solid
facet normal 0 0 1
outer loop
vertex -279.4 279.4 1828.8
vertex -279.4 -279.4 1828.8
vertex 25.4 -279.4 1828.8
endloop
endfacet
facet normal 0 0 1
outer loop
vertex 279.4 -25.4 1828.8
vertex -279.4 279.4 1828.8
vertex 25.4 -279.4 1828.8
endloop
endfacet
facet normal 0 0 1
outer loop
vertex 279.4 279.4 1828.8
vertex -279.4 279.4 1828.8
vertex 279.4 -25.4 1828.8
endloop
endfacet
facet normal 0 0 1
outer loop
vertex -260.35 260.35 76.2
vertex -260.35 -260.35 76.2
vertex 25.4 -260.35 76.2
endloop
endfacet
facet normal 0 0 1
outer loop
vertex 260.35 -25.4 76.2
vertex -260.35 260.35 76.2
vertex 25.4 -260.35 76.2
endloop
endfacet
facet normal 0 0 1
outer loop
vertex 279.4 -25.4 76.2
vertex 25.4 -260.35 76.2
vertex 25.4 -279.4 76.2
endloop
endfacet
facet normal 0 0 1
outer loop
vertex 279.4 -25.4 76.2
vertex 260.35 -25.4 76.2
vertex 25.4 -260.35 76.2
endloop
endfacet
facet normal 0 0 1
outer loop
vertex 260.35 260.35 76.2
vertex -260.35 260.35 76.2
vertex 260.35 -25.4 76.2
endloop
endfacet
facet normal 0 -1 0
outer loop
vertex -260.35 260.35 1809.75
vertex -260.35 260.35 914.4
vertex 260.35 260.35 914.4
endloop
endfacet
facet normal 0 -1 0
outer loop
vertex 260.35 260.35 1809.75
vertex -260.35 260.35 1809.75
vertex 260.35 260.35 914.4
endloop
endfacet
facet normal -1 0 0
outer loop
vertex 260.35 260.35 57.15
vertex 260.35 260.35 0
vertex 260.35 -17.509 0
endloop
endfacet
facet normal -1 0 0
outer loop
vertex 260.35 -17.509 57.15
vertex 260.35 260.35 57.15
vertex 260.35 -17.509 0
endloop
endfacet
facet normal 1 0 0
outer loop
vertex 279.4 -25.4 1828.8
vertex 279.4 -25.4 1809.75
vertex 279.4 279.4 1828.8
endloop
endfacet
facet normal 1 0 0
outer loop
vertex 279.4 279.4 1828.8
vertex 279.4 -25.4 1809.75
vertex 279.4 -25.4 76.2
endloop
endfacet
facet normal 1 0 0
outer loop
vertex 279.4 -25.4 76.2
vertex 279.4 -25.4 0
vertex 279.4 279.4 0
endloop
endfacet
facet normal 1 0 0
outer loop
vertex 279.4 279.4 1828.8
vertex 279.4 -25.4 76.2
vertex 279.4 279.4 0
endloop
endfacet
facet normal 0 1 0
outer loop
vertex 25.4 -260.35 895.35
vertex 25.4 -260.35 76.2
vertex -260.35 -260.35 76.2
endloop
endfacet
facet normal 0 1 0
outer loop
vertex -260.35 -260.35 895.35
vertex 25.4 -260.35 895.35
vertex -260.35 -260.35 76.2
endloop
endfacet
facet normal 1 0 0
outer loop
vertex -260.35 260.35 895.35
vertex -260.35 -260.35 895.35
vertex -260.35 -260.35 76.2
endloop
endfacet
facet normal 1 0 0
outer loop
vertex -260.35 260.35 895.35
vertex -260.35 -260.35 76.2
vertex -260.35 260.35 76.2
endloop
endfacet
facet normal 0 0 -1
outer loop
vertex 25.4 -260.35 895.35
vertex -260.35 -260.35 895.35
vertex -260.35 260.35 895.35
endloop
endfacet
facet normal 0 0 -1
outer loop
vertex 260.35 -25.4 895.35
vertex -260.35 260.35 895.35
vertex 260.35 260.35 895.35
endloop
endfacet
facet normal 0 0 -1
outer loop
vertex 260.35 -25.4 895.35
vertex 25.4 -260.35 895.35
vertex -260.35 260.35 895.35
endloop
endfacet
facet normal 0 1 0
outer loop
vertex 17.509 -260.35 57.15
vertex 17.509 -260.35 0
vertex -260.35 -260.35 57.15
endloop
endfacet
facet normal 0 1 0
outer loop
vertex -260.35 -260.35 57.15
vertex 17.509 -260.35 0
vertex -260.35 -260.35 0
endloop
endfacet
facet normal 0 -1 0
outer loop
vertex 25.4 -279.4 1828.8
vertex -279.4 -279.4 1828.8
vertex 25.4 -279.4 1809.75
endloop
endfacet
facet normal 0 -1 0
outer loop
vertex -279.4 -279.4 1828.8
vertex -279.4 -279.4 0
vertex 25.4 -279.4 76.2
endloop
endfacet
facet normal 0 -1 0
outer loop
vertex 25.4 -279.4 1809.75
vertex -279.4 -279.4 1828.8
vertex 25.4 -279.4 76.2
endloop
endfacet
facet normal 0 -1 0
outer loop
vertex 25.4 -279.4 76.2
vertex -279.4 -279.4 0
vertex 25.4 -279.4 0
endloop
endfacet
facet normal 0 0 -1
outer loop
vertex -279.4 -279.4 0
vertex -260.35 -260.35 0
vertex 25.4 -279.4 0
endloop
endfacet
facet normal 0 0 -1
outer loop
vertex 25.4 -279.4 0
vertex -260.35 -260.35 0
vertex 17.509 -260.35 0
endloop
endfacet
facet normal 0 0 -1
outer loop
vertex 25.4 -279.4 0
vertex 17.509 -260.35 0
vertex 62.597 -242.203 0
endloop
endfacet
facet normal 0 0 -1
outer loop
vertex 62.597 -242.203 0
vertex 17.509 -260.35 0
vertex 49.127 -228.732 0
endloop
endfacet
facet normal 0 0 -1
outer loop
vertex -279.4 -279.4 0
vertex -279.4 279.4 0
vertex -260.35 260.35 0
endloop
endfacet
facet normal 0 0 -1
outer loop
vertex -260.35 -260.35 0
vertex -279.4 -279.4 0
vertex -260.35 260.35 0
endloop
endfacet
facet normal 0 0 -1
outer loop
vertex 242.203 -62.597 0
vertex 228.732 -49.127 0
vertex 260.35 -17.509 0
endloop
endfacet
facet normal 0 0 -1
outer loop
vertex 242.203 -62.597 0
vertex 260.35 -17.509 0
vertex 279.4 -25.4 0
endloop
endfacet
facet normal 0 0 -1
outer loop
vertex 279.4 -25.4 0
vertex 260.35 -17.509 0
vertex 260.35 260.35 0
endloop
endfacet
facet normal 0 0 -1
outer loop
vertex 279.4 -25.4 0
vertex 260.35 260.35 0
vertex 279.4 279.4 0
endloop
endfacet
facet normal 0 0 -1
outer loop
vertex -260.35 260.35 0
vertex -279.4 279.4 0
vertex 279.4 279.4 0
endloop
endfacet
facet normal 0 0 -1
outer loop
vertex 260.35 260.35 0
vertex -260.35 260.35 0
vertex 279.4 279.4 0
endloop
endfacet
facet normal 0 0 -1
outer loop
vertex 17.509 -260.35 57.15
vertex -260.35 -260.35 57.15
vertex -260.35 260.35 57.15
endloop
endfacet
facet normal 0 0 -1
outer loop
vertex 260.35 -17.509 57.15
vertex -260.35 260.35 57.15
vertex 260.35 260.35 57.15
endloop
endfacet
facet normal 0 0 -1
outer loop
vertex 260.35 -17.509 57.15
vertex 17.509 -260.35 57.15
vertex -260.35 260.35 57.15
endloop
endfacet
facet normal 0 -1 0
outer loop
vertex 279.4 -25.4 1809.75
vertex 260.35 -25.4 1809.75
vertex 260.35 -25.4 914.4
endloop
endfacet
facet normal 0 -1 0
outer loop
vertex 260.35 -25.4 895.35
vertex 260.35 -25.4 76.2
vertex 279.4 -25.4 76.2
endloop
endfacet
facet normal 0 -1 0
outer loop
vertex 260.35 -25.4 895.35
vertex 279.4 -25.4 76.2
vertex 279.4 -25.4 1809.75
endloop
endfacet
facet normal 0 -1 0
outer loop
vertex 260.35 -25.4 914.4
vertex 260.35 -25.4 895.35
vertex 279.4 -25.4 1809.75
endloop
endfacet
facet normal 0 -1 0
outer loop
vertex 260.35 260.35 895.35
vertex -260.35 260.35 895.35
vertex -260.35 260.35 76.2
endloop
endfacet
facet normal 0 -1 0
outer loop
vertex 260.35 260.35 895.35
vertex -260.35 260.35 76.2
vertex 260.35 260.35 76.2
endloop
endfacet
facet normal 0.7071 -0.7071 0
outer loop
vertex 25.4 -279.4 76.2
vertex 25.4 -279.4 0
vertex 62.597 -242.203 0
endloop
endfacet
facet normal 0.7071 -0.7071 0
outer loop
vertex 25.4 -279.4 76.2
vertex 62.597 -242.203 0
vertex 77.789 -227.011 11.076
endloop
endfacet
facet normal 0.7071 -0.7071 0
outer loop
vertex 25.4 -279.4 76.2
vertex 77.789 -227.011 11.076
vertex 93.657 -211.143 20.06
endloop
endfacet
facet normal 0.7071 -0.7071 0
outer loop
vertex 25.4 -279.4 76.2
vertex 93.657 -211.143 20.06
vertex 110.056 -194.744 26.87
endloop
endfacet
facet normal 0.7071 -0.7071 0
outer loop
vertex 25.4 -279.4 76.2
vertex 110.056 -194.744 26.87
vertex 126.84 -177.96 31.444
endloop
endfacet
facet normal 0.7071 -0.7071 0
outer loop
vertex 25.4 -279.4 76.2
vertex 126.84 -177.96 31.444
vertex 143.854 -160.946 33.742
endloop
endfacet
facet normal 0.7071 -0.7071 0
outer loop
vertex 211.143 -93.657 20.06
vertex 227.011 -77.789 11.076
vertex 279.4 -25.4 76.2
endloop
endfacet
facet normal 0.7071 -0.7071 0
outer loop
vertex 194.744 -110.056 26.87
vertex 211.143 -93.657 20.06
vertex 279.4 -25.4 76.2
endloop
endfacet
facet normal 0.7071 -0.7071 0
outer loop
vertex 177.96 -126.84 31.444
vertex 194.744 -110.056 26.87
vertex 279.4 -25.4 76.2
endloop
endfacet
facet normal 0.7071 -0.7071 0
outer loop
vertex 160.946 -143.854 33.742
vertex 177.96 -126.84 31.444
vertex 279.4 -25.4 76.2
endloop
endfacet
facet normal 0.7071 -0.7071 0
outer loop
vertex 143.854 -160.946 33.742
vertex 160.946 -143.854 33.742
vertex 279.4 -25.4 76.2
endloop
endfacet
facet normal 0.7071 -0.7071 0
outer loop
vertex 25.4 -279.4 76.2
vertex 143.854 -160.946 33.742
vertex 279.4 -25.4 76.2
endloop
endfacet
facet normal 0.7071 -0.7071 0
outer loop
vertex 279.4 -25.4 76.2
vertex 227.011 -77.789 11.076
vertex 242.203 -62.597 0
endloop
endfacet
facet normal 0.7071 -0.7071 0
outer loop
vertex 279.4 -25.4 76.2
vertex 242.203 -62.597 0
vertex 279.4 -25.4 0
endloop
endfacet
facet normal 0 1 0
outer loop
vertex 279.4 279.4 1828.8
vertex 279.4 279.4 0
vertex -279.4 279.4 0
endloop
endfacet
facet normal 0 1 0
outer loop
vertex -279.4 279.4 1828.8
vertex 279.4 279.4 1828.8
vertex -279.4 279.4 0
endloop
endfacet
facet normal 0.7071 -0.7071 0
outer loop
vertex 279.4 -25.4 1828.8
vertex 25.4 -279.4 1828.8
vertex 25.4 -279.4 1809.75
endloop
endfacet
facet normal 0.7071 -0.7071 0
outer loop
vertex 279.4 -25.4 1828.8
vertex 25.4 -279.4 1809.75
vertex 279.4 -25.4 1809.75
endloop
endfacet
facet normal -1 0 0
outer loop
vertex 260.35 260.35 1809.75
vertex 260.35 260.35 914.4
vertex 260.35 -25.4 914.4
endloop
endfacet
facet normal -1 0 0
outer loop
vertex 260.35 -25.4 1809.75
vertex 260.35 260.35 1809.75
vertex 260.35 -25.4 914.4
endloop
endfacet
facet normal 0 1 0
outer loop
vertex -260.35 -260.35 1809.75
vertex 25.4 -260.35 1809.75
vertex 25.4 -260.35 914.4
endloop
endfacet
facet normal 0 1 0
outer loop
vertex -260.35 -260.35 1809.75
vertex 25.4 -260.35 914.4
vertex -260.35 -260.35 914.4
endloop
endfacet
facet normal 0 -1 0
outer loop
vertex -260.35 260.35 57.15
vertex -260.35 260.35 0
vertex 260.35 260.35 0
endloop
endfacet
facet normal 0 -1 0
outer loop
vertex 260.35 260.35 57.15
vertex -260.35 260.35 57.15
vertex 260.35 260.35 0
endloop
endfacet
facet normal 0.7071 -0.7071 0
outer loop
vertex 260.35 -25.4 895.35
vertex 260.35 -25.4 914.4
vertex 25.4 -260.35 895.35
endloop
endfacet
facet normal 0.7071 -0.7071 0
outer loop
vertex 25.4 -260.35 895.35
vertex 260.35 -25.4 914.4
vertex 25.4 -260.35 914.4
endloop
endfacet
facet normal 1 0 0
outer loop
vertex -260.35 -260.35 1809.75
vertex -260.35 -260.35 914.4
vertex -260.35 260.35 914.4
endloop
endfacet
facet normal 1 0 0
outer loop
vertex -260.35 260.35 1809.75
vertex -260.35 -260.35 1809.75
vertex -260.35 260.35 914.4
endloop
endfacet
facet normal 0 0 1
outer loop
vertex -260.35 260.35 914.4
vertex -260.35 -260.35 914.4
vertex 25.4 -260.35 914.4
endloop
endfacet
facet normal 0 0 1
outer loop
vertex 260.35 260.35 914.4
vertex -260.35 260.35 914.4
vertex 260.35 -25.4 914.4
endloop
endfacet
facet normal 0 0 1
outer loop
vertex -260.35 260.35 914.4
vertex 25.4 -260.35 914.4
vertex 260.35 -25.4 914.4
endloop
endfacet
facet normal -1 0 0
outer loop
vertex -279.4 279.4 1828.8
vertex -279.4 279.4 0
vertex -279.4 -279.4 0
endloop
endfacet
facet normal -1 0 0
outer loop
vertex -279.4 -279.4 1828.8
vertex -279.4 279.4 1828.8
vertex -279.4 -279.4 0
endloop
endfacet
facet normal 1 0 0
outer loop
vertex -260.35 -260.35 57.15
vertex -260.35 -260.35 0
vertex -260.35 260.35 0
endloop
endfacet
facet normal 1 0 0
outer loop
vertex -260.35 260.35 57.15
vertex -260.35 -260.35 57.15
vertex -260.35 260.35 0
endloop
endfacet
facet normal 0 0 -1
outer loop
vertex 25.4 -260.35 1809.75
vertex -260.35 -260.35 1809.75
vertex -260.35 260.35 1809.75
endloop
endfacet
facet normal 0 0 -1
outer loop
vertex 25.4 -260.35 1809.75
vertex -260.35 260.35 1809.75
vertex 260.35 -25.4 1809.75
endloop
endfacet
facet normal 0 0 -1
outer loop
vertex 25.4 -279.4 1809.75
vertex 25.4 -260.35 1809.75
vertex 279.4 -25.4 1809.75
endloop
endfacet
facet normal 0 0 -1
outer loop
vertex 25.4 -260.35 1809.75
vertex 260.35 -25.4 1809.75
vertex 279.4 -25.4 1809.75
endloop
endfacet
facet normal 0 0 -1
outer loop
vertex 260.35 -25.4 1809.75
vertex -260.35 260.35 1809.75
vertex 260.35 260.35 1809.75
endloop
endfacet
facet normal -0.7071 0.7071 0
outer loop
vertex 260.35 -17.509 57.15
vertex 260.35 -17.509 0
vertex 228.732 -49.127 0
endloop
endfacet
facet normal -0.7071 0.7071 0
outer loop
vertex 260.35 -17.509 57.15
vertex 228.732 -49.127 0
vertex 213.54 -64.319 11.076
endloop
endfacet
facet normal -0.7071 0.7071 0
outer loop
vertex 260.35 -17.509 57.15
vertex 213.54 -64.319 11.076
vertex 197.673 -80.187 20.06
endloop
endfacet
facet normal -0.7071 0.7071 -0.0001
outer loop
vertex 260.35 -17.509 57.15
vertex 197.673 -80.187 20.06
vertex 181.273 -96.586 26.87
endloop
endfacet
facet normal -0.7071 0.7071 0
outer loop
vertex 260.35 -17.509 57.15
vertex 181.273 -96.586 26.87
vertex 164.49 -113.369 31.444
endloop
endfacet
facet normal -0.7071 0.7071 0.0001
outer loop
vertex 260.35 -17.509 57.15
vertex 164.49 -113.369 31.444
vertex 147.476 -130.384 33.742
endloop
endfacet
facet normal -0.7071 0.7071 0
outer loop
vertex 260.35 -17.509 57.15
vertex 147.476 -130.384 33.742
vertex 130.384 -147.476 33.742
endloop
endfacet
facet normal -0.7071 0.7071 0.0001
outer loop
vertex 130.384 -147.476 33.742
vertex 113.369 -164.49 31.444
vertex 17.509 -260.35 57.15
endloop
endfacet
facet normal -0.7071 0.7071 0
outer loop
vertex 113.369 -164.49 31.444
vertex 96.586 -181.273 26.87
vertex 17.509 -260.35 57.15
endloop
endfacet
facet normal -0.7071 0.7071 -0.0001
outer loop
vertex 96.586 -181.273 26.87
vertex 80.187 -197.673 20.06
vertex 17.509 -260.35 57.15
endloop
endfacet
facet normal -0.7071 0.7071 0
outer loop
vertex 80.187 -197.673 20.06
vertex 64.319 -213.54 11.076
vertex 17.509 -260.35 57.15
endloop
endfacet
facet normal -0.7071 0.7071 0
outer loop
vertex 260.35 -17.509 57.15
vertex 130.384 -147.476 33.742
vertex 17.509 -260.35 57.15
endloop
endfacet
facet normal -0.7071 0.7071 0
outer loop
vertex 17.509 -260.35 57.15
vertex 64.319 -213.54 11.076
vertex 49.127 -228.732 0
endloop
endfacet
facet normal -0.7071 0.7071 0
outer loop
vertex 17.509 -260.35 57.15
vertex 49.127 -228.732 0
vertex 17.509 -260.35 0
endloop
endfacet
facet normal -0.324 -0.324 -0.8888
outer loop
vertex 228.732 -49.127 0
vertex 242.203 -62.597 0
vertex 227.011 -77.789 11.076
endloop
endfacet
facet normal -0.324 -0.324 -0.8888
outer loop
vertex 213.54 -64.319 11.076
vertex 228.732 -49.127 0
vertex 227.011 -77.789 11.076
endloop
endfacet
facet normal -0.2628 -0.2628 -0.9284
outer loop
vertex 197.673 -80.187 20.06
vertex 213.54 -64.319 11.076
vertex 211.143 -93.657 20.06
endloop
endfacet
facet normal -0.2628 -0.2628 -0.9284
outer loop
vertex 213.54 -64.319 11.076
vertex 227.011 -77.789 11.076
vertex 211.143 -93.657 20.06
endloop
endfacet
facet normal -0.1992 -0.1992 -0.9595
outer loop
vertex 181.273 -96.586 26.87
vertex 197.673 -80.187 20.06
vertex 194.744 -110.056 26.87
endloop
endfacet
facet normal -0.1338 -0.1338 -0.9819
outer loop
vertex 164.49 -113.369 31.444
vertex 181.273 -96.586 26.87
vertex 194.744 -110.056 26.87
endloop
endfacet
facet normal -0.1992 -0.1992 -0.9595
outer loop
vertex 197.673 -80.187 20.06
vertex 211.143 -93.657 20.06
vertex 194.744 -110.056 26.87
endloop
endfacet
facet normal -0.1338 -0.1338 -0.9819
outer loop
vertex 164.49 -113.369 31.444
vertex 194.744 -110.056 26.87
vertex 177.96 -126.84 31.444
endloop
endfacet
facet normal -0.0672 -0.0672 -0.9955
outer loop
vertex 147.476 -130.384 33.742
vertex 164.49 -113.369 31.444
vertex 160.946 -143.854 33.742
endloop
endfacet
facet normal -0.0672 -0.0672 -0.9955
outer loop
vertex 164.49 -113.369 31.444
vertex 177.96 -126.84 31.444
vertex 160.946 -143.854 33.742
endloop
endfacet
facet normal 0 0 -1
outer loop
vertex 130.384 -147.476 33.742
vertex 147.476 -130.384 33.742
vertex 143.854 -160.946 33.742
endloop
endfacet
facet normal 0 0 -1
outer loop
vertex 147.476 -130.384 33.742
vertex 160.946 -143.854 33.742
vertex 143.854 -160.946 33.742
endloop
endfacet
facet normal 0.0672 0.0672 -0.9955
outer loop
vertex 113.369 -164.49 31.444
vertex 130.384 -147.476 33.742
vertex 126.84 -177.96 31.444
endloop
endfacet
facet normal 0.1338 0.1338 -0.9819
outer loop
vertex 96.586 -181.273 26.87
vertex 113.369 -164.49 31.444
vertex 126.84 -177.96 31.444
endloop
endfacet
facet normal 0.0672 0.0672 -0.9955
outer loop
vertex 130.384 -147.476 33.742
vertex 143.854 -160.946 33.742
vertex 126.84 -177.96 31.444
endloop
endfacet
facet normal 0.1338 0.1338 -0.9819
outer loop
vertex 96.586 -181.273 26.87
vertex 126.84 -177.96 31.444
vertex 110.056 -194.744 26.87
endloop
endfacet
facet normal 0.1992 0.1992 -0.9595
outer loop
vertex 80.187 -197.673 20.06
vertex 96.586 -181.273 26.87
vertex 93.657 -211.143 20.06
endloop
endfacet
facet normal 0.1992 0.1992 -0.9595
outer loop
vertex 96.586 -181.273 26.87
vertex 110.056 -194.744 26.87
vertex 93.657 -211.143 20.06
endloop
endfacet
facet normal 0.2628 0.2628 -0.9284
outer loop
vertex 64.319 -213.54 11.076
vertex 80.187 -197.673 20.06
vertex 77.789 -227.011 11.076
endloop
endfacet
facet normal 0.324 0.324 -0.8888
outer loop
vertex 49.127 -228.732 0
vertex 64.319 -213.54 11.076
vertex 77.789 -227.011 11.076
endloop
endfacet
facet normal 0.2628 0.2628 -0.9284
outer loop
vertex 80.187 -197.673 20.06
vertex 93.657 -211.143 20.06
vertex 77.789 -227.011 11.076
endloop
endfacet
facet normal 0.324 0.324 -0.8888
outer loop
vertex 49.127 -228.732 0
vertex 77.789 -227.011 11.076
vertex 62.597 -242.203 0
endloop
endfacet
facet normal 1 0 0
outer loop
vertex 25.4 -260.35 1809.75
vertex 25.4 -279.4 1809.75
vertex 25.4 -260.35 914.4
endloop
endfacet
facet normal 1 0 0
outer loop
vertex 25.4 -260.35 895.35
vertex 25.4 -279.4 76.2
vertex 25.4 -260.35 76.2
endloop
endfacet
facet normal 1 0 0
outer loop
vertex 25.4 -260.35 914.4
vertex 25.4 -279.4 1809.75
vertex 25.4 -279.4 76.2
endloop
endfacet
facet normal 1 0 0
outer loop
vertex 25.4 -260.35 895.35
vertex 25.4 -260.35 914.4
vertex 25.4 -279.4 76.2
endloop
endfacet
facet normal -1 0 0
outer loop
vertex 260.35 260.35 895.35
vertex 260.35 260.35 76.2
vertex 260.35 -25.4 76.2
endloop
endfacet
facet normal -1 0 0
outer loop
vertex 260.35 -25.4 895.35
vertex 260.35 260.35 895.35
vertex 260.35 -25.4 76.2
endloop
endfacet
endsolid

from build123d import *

# Parameters (mm, degrees)
F1_DEPTH  = 1828.8
F3_DEPTH  = 19.05
F5_DEPTH  = 76.2
F7_DEPTH  = 57.15
F9_DEPTH  = 25.4
F12_DEPTH = 19.05


with BuildPart() as f1:
    # F0 (on Top) → F1 (new body)
    with BuildSketch(Plane.XY):
        Polygon((279.4, 279.4), (-279.4, 279.4), (-279.4, -279.4), (25.4, -279.4), (25.4, -260.35), (-260.35, -260.35), (-260.35, 260.35), (260.35, 260.35), (260.35, -25.4), (279.4, -25.4), align=None)
    extrude(amount=F1_DEPTH)

    # F2 (on face) → F3 (join)
    with BuildSketch(Plane.XY.offset(1828.8)):
        Polygon((-279.4, -279.4), (25.4, -279.4), (279.4, -25.4), (279.4, 279.4), (-279.4, 279.4), align=None)
    extrude(amount=-F3_DEPTH)

    # F4 (on Top) → F5 (join)
    with BuildSketch(Plane.XY):
        Polygon((-279.4, -279.4), (25.4, -279.4), (279.4, -25.4), (279.4, 279.4), (-279.4, 279.4), align=None)
    extrude(amount=F5_DEPTH)

    # F6 (on face) → F7 (cut)
    with BuildSketch(Plane(origin=(0, 0, 0), x_dir=(1, 0, 0), z_dir=(0, 0, -1))):
        Polygon((-260.35, -260.35), (260.35, -260.35), (260.35, 17.5092316368), (17.5092316368, 260.35), (-260.35, 260.35), align=None)
    extrude(amount=-F7_DEPTH, mode=Mode.SUBTRACT)

    # F8 (on face) → F9 (cut)
    with BuildSketch(Plane(origin=(152.4, -152.4, 0), x_dir=(0.7071067812, 0.7071067812, 0), z_dir=(0.7071067812, -0.7071067812, 0))):
        with BuildLine():
            Line((-127, 0), (127, 0))
            ThreePointArc((127, 0), (0, 34.0295474388), (-127, 0))
        make_face()
    extrude(amount=-F9_DEPTH, mode=Mode.SUBTRACT)

    # F11 (on offset) → F12 (join)
    with BuildSketch(Plane(origin=(0, 0, 914.4), x_dir=(1, 0, 0), z_dir=(0, 0, -1))):
        Polygon((-260.35, 260.35), (-260.35, -260.35), (260.35, -260.35), (260.35, 25.4), (25.4, 260.35), align=None)
    extrude(amount=F12_DEPTH)


solid = f1.part
